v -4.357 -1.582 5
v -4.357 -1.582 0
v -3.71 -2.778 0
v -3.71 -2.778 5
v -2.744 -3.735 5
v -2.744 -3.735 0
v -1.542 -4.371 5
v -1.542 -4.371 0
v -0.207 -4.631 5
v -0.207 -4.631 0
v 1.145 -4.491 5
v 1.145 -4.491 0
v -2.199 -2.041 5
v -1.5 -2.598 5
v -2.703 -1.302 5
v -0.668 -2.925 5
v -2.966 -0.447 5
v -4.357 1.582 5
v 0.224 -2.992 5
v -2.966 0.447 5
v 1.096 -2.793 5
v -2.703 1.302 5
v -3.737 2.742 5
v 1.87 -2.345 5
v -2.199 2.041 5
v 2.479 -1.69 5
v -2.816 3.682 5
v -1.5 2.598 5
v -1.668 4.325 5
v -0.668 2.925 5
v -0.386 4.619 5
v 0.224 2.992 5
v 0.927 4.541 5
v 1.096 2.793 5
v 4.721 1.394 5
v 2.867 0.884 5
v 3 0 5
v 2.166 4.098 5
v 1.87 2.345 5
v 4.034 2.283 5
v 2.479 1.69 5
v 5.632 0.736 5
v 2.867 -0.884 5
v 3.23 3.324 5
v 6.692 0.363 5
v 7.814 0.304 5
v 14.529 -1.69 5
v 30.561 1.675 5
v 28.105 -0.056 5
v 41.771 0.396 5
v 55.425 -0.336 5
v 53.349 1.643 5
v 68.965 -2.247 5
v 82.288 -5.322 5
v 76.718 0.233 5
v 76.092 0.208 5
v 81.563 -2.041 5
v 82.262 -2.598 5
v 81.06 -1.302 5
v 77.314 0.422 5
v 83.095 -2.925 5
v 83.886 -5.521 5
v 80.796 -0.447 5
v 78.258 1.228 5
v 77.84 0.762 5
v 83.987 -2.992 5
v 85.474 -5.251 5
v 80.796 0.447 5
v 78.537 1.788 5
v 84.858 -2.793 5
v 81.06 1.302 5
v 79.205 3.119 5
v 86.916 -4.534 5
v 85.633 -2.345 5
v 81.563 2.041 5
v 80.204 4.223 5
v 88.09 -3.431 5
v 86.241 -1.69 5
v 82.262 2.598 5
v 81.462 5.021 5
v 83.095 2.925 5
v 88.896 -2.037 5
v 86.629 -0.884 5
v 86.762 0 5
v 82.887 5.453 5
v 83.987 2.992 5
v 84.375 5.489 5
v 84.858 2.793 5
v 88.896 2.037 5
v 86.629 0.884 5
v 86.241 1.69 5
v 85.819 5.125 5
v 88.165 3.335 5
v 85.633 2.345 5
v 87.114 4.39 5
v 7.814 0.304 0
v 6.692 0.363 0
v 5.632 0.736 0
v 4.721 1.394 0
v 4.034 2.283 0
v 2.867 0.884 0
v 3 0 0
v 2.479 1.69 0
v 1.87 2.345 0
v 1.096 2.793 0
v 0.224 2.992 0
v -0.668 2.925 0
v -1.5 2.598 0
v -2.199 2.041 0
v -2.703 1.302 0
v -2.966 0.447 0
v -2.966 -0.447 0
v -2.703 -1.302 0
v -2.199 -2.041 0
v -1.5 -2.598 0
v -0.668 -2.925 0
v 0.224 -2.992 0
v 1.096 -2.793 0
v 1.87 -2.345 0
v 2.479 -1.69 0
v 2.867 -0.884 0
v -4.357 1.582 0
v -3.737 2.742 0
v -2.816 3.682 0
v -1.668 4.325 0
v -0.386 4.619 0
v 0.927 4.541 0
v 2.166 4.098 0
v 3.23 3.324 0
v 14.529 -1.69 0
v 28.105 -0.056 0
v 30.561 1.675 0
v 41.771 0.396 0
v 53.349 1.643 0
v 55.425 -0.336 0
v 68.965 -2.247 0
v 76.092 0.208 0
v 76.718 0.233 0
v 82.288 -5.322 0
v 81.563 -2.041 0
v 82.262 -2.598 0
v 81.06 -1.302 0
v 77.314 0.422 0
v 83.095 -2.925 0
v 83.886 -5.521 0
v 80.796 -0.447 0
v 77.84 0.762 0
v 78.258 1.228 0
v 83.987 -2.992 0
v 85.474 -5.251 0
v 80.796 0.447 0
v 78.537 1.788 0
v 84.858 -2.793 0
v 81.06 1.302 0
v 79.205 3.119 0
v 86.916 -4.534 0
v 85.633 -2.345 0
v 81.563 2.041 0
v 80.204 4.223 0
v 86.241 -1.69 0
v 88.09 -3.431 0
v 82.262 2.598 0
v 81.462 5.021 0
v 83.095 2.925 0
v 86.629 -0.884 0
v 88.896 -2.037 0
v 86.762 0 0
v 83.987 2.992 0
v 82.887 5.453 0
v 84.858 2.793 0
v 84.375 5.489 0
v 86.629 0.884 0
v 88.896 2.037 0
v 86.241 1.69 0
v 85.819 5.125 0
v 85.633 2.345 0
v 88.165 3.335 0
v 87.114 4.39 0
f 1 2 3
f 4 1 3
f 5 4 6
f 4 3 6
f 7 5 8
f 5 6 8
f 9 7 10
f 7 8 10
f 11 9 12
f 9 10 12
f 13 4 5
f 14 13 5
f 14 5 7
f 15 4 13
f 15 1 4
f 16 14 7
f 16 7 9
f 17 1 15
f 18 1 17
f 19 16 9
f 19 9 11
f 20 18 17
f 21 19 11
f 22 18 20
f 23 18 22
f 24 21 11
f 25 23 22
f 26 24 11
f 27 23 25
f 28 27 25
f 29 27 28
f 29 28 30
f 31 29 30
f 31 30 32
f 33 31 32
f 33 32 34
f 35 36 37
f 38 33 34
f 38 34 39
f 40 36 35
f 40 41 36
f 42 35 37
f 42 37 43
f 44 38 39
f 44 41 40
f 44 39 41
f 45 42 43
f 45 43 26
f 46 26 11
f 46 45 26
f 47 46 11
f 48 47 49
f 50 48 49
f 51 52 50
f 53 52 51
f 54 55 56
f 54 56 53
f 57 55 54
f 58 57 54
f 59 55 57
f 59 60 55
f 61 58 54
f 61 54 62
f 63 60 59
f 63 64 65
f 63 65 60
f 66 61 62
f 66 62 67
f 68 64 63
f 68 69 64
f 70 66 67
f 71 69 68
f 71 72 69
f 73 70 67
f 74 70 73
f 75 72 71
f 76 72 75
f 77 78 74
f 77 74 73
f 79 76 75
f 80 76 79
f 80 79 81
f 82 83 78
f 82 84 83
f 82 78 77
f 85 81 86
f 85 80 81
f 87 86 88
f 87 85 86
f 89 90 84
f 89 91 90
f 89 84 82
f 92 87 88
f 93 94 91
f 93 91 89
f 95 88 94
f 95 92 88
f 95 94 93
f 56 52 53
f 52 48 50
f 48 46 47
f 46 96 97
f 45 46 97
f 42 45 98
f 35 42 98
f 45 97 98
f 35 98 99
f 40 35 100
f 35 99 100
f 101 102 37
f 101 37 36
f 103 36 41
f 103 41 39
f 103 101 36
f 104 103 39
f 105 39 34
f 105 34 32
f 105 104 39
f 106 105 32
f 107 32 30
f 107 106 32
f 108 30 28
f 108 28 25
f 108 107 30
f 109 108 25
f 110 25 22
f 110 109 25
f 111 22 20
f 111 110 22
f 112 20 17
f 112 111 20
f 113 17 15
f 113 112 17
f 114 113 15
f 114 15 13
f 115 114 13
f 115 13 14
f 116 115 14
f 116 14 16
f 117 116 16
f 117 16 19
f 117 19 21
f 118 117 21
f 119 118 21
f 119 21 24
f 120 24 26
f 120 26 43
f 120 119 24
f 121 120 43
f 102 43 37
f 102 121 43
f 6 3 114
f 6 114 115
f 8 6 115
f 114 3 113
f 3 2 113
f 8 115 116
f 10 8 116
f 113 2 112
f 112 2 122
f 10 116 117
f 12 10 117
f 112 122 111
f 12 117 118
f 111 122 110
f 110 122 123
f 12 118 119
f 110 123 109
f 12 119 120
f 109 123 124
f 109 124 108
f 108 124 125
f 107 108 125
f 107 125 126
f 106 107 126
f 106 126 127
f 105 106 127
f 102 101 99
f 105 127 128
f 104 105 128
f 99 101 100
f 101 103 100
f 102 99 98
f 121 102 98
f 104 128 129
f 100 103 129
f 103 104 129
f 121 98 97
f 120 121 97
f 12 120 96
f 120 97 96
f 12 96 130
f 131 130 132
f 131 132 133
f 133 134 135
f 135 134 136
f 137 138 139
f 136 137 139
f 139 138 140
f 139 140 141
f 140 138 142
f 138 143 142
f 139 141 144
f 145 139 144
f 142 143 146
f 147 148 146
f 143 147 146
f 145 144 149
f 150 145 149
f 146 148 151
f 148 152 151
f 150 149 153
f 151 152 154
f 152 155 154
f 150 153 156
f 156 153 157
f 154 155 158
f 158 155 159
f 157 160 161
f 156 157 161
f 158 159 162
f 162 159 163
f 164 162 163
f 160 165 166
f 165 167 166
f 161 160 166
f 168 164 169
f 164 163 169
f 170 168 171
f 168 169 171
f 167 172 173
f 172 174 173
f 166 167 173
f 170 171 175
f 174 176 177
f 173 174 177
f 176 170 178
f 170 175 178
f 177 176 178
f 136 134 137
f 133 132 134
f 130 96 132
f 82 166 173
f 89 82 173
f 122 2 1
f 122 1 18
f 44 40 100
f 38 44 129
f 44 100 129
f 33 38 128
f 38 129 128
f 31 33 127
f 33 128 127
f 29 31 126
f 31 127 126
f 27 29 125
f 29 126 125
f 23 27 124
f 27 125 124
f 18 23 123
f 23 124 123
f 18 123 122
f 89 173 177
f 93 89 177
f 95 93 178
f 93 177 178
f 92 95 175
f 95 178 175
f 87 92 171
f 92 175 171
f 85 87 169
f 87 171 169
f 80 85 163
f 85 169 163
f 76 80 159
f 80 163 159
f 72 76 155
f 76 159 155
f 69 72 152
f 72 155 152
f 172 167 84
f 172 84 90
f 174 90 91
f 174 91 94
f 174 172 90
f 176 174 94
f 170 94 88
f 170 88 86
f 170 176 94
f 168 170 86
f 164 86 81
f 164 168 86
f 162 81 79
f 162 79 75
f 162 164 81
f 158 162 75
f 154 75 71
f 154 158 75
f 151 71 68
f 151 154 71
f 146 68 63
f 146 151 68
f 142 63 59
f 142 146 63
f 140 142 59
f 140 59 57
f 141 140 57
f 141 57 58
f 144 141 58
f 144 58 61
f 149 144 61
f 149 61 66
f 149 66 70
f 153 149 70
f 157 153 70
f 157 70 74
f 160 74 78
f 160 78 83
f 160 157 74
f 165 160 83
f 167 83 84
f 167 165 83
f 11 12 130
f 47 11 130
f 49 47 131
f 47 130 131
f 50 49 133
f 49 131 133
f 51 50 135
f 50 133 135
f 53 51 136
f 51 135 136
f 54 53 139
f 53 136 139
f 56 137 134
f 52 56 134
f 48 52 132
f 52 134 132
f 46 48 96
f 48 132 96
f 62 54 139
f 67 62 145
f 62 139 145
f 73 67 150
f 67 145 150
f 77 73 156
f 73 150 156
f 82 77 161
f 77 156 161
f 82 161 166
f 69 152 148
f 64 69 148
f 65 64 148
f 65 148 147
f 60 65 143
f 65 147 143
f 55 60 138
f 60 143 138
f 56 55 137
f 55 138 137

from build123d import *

# Parameters (mm, degrees)
SZKIC1_R                    = 3.000000079
DODANIE_WYCI_GNI_CIE1_DEPTH = 5
SZKIC2_W                    = 105.552332286
SZKIC2_H                    = 7.505645785
SZKIC2_W_2                  = 0.651830256
SZKIC2_H_2                  = 5.051684483
WYTNIJ_WYCI_GNI_CIE3_DEPTH  = 6


with BuildPart() as part:
    # Szkic1 → Dodanie-wyciągnięcie1 (new body)
    with BuildSketch(Plane.XY):
        with BuildLine():
            ThreePointArc((82.288446866, -5.322288535), (88.646994763, 2.576863373), (78.537310202, 1.78818708))
            ThreePointArc((78.537310202, 1.78818708), (77.588574134, 0.574418105), (76.092138721, 0.208335732))
            ThreePointArc((76.092138721, 0.208335732), (41.955082096, 1.834260744), (7.813610577, 0.303839332))
            ThreePointArc((7.813610577, 0.303839332), (5.63200922, 0.736314196), (4.033915145, 2.283089654))
            ThreePointArc((4.033915145, 2.283089654), (-4.263785422, 1.817994402), (1.14538756, -4.491442653))
            ThreePointArc((1.14538756, -4.491442653), (41.771214226, 0.395953927), (82.288446866, -5.322288535))
        make_face()
        Circle(SZKIC1_R, mode=Mode.SUBTRACT)
        with Locations((83.76241555, 0)):
            Circle(SZKIC1_R, mode=Mode.SUBTRACT)
    extrude(amount=DODANIE_WYCI_GNI_CIE1_DEPTH)

    # Szkic2 → Wytnij-wyciągnięcie3 (cut, through all)
    with BuildSketch(Plane.XY):
        with Locations((141.671704443, 0.381285041)):
            Rectangle(SZKIC2_W, SZKIC2_H)
        with Locations((-4.682734605, -0.038745932)):
            Rectangle(SZKIC2_W_2, SZKIC2_H_2)
    extrude(amount=WYTNIJ_WYCI_GNI_CIE3_DEPTH, mode=Mode.SUBTRACT)


solid = part.part
